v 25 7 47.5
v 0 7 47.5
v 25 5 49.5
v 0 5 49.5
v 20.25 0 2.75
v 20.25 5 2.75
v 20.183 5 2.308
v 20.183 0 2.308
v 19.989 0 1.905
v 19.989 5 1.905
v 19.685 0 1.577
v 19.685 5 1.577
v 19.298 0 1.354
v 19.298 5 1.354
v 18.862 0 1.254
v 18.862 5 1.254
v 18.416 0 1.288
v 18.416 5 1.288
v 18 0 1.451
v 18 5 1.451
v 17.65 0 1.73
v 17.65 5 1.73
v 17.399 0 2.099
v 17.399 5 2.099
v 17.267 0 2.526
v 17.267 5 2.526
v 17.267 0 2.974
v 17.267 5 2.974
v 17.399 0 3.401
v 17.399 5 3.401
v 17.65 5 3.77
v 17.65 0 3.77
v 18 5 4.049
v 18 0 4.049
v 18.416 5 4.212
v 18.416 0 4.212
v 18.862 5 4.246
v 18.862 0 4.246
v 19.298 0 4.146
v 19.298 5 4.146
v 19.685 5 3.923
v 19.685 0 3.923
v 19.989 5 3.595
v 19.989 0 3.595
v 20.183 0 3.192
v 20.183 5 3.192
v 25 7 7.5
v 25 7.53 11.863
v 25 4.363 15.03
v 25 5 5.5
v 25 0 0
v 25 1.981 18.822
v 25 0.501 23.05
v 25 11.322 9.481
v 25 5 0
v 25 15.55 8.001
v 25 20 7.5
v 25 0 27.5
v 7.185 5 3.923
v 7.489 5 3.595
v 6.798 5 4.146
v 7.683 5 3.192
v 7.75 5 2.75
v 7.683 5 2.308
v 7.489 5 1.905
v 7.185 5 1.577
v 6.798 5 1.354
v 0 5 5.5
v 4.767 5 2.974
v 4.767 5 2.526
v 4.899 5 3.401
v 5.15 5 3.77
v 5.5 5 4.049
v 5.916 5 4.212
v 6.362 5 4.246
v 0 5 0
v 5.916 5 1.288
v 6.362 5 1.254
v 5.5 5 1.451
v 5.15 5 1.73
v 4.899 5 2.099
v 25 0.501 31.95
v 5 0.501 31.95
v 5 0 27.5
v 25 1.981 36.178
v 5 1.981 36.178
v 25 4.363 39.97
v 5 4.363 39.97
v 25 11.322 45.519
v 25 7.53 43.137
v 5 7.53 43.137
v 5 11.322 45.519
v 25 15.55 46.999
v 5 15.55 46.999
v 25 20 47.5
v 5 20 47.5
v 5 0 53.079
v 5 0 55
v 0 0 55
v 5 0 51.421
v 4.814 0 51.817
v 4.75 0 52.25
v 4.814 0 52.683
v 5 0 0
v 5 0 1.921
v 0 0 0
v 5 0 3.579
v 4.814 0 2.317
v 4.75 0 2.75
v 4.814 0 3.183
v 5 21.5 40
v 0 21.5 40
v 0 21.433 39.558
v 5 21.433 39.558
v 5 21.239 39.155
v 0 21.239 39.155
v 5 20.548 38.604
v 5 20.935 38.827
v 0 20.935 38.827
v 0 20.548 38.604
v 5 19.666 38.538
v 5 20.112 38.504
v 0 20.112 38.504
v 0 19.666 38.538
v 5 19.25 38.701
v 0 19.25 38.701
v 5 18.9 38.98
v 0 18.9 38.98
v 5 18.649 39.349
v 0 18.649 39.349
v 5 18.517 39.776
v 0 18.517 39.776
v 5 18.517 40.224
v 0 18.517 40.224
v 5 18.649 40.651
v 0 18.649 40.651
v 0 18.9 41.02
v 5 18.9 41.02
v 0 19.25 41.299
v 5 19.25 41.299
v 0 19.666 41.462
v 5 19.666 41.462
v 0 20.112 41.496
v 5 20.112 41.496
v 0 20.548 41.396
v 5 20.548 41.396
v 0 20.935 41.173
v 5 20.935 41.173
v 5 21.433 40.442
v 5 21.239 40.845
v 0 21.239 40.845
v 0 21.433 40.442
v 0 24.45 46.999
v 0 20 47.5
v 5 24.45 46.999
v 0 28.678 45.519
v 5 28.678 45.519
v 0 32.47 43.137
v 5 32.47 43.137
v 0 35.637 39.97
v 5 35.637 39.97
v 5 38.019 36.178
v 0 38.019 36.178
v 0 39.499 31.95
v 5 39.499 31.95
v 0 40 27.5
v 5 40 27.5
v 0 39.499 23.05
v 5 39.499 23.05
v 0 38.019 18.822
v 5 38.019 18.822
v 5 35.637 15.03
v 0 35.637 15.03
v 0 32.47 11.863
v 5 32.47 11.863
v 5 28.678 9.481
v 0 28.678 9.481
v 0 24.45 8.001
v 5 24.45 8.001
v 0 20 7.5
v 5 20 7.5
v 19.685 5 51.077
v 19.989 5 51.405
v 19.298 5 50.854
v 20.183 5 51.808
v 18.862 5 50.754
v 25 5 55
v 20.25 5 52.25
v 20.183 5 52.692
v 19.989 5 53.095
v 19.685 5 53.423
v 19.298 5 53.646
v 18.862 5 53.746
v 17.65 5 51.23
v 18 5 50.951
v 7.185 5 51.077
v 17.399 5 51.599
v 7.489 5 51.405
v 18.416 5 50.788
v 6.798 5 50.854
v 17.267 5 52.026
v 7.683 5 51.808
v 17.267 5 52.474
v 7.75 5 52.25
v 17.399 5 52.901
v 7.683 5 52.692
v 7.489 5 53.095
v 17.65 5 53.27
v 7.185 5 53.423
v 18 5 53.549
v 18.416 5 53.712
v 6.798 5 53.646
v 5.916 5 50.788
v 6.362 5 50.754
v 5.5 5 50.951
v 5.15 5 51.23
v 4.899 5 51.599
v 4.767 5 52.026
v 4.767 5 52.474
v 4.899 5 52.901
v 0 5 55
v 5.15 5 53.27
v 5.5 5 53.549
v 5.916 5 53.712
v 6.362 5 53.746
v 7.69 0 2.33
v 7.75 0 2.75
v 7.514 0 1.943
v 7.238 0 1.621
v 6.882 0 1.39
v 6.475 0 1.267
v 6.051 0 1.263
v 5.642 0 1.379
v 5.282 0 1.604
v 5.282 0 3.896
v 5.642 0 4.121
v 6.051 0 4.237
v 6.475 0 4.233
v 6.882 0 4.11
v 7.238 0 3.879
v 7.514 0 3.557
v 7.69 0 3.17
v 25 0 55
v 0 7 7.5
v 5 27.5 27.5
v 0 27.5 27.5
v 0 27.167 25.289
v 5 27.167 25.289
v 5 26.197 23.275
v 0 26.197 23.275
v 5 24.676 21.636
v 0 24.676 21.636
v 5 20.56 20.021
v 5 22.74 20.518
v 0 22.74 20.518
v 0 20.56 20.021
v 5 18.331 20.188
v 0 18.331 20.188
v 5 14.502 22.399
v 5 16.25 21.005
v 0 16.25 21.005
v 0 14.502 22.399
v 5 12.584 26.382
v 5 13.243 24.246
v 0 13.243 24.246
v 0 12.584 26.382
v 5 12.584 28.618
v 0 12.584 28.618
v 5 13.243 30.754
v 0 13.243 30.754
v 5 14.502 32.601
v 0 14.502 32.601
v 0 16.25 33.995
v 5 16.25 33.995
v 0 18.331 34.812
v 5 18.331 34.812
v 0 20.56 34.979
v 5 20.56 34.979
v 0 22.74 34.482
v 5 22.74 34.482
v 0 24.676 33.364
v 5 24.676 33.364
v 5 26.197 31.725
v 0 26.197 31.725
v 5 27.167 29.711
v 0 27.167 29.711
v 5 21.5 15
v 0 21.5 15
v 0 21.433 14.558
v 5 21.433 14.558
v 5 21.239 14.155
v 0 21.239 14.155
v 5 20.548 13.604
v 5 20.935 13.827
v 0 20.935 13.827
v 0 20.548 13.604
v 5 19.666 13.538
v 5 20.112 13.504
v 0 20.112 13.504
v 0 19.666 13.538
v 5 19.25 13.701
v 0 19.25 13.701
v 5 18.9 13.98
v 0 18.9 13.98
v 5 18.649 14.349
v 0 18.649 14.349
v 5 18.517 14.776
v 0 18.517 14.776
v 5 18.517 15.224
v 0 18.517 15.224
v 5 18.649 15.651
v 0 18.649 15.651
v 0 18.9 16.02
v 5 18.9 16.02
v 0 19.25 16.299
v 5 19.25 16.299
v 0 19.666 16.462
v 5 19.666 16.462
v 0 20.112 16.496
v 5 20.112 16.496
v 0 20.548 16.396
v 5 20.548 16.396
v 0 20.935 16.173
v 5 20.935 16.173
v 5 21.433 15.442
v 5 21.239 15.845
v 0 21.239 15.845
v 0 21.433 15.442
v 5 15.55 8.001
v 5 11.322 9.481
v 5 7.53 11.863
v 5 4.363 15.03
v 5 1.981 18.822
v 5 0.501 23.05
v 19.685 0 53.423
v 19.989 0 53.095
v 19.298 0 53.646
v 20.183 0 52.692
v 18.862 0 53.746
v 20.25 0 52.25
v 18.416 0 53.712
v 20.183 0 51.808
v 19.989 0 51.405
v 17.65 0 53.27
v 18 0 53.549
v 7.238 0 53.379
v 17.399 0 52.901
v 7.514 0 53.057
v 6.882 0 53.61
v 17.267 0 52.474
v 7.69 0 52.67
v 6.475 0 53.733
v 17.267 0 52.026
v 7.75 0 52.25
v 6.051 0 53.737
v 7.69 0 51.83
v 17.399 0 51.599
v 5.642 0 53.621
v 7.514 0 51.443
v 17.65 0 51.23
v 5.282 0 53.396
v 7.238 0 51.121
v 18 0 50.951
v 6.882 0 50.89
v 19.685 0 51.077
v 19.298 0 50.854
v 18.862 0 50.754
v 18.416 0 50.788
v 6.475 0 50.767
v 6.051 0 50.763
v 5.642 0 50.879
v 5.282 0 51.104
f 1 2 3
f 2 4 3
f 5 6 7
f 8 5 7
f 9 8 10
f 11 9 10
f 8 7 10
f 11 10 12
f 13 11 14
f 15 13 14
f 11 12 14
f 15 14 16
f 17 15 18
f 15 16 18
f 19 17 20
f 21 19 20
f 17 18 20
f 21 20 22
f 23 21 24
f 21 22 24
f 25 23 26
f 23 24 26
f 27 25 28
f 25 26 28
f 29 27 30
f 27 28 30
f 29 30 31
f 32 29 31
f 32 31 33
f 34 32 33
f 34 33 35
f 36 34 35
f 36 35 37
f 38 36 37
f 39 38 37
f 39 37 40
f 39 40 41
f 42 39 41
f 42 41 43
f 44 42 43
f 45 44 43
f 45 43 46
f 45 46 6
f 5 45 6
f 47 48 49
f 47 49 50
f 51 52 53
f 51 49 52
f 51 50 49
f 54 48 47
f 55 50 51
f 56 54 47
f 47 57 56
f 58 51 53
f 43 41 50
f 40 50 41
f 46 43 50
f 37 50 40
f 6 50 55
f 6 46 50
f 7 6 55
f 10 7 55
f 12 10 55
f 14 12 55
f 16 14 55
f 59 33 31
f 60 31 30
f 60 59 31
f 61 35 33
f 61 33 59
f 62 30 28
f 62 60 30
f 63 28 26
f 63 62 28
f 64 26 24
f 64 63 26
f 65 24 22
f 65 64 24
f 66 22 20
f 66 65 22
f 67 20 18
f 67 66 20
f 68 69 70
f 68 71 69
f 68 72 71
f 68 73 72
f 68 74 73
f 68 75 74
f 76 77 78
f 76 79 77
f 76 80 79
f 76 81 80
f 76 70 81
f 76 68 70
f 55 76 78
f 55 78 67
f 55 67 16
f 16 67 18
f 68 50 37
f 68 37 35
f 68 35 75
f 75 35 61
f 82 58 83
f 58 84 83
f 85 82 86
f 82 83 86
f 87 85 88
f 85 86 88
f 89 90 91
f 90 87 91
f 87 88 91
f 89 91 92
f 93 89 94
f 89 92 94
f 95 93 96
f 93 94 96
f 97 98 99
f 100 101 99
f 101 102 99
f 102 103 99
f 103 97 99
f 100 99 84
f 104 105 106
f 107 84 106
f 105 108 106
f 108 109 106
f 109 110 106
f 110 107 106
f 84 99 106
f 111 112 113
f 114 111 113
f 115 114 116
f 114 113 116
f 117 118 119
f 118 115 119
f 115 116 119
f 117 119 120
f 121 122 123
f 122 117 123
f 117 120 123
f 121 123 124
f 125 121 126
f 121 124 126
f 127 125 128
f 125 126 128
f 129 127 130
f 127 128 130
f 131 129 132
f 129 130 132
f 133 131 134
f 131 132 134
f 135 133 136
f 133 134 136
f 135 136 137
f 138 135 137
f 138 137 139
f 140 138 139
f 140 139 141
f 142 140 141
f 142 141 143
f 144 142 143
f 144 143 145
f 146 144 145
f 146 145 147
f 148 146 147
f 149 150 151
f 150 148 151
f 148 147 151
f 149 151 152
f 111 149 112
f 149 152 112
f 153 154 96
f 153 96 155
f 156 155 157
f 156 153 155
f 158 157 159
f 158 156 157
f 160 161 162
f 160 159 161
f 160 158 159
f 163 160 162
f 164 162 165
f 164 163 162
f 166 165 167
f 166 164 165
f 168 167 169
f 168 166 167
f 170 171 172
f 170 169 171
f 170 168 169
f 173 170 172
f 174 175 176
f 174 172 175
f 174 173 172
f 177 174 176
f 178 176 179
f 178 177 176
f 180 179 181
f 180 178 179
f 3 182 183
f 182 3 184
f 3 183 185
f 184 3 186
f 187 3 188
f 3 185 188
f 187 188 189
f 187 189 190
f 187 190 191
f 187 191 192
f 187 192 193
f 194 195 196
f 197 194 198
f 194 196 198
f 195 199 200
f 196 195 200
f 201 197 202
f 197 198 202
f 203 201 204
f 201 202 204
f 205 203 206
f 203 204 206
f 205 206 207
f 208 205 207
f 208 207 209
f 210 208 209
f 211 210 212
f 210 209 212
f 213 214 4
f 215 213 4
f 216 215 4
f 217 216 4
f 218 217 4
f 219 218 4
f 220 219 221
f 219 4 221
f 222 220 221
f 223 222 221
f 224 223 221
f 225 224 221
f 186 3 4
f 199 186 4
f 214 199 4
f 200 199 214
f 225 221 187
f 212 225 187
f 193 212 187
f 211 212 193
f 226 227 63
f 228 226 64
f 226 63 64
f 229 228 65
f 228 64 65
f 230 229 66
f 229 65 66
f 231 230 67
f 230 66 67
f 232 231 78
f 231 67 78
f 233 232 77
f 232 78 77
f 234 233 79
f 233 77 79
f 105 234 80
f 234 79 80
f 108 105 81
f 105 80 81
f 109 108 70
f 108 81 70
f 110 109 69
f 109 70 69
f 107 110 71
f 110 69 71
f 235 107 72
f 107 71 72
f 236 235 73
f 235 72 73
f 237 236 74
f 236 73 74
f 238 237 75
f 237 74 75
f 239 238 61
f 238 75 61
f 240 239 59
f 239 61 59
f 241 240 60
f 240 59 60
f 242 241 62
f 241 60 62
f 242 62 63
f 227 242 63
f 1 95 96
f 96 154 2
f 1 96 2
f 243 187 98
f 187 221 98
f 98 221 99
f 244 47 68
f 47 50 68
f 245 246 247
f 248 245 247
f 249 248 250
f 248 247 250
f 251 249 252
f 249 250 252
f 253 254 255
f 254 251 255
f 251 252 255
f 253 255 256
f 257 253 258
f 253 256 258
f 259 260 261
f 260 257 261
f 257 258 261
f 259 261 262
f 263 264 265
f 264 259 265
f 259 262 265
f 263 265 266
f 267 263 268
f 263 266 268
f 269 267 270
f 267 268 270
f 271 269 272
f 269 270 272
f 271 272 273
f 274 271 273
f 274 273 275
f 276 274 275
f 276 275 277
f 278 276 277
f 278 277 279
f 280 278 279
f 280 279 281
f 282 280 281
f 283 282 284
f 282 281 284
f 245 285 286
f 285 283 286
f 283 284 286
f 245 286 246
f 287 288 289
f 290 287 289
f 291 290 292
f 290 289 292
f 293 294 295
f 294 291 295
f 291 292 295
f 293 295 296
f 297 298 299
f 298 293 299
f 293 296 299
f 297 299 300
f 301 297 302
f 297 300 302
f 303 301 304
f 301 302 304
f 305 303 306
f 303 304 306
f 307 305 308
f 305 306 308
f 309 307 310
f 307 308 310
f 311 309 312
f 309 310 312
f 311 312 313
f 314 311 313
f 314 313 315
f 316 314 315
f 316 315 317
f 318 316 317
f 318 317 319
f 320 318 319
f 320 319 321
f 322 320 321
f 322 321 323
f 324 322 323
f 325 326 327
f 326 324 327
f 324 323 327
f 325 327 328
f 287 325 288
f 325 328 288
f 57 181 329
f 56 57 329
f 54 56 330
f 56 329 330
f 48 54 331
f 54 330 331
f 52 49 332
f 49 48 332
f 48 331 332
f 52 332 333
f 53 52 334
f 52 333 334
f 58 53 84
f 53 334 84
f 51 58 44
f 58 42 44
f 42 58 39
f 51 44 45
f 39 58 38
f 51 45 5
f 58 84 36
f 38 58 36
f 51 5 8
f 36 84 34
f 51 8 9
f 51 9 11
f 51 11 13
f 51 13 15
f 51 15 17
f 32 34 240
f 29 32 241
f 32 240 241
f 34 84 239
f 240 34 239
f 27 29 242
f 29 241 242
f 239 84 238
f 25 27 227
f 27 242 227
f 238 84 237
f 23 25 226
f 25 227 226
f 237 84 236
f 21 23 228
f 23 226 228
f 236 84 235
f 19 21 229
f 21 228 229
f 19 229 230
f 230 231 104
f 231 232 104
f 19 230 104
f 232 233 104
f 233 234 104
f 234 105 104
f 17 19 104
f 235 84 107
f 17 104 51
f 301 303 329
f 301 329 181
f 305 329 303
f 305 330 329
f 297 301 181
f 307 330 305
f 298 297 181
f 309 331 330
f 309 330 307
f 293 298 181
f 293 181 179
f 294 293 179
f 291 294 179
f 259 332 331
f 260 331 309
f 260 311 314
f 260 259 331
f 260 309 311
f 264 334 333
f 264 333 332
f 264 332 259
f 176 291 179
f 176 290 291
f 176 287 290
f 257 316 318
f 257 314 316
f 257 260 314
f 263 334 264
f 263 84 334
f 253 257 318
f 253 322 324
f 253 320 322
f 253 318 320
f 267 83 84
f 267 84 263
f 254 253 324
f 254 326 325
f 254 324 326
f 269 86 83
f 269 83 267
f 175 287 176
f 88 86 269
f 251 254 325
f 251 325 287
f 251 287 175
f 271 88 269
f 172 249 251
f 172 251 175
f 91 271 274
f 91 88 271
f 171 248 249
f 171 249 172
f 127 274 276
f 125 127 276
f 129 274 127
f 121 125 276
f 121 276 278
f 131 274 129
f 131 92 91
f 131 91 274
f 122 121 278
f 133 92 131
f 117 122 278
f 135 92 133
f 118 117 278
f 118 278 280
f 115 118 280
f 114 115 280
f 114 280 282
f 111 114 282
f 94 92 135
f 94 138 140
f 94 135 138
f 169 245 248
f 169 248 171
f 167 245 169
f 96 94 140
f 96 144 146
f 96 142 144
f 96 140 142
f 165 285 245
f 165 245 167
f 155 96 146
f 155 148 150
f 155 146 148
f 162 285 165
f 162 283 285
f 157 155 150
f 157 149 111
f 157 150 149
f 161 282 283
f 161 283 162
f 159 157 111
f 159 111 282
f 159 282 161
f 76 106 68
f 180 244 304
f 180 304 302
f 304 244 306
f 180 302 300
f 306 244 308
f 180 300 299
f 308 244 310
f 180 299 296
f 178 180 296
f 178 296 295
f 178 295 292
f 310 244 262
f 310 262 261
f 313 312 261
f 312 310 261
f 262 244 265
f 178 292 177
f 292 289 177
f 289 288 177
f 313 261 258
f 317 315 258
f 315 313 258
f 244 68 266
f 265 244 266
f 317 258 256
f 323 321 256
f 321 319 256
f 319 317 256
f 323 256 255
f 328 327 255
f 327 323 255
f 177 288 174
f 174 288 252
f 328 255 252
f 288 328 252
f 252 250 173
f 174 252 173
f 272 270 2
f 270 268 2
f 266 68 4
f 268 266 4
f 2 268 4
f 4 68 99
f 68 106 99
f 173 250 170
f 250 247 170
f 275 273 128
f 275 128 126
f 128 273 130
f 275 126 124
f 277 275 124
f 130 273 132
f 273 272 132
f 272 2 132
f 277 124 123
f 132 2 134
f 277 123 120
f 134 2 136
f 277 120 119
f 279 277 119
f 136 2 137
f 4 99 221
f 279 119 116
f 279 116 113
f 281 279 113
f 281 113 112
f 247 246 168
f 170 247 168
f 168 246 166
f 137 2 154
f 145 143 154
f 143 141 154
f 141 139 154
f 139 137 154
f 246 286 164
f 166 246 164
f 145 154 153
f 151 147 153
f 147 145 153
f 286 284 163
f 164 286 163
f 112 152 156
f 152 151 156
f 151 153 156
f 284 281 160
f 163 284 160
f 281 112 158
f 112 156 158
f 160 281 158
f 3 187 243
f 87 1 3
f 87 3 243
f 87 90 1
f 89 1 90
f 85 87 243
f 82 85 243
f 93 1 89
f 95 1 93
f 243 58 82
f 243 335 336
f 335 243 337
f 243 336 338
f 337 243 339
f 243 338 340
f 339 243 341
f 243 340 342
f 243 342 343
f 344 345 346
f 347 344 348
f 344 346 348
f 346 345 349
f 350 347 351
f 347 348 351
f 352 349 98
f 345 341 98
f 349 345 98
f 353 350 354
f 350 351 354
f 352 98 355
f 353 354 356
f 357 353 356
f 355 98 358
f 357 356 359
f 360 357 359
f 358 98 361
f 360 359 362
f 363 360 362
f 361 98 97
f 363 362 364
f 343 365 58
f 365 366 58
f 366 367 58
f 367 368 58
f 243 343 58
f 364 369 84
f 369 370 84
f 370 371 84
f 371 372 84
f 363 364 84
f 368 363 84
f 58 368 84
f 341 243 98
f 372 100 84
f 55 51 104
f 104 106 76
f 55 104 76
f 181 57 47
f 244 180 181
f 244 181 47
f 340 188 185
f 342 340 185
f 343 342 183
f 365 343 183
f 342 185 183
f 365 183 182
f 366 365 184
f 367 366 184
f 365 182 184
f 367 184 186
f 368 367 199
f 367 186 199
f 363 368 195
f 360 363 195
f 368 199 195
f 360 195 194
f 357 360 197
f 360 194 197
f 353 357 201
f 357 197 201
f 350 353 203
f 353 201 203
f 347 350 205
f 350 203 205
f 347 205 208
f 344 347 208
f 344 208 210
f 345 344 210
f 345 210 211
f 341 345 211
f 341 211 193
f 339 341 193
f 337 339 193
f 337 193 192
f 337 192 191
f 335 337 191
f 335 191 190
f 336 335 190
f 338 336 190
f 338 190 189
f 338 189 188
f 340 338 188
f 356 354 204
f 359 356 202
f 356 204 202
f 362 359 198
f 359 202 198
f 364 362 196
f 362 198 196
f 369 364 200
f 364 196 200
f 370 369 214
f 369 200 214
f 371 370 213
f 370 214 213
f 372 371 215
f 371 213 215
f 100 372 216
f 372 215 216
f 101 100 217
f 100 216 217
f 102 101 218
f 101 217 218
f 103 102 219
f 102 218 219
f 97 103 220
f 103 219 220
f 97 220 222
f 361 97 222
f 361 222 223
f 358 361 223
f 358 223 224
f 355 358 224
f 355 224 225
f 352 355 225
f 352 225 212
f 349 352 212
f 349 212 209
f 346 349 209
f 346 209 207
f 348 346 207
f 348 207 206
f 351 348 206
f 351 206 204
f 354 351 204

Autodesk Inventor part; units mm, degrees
ref_plane "YZ Plane" through (0, 0, 0) normal (1, 0, 0) x (0, 1, 0)
ref_plane "XZ Plane" through (0, 0, 0) normal (0, 1, 0) x (-1, 0, 0)
ref_plane "XY Plane" through (0, 0, 0) normal (0, 0, 1) x (1, 0, 0)
sketch "Sketch1" plane through (0, 0, 0) normal (1, 0, 0) x (0, 1, 0)
  arc A0 (20, 7.5) -> (20, 47.5) centre (20, 27.5) ccw
  line L0 (5, 55) -> (0, 55)
  line L1 (0, 55) -> (0, 0)
  line L2 (0, 0) -> (5, 0)
  circle A1 centre (20, 27.5) radius 20 construction
  circle A2 centre (20, 15) radius 1.5
  circle A3 centre (20, 40) radius 1.5
  circle A4 centre (20, 27.5) radius 7.5
  line L3 (20, 47.5) -> (5, 47.5)
  line L4 (5, 47.5) -> (5, 55)
  line L5 (20, 7.5) -> (5, 7.5)
  line L6 (5, 7.5) -> (5, 0)
  dimension "d0" = 20
  dimension "d3" = 5
  dimension "d5" = 3
  dimension "d6" = 3
  dimension "d7" = 25
  dimension "d8" = 12.5
  dimension "d9" = 15
  dimension "d30" = 55
extrude "Extrusion1" add sketch "Sketch1" along normal blind 5
sketch "Sketch2" plane through (5, 0, 0) normal (1, 0, 0) x (0, 0, -1)
  line L0 (-55, 5) -> (-55, 0) projected
  line L1 (-47.5, 20) -> (-47.5, 5) projected
  line L2 (-55, 5) -> (-47.5, 5)
  line L3 (-47.5, 5) -> (-47.5, 20)
  line L4 (-55, 0) -> (0, 0) projected
  line L5 (-55, 0) -> (0, 0)
  line L6 (-55, 0) -> (-55, 5)
  circle A0 centre (-27.5, 20) radius 20
  arc A1 (-7.5, 20) -> (-47.5, 20) centre (-27.5, 20) ccw projected
  line L7 (0, 0) -> (0, 5) projected
  line L8 (0, 0) -> (0, 5)
  line L9 (0, 5) -> (-7.5, 5)
  line L10 (-7.5, 5) -> (-7.5, 20) projected
  line L11 (-7.5, 5) -> (-7.5, 20)
  point P0 (-7.5, 20)
  point P1 (-27.5, 0)
extrude "Extrusion2" add sketch "Sketch2" along normal blind 20 contours L2 L1 A0 L4 L0 | A0 L10 L9 L7 L4
chamfer "Chamfer1" distance 2 angle 45 2 edges at (12.5, 5, 7.5) (12.5, 5, 47.5)
sketch "Sketch3" plane through (0, 5, 0) normal (0, 1, 0) x (1, 0, 0)
  circle A0 centre (6.25, -2.75) radius 1.5
  circle A1 centre (18.75, -2.75) radius 1.5
  circle A2 centre (6.25, -52.25) radius 1.5
  circle A3 centre (18.75, -52.25) radius 1.5
  line L0 (0, -55) -> (25, -55) projected
  line L1 (0, -49.5) -> (25, -49.5) projected
  line L2 (0, 0) -> (25, 0) projected
  line L3 (25, -5.5) -> (0, -5.5) projected
  line L4 (0, -49.5) -> (0, -55) projected
  line L5 (25, -49.5) -> (25, -55) projected
  dimension "d20" = 3
  dimension "d21" = 2.75
  dimension "d22" = 2.75
  dimension "d23" = 2.75
  dimension "d24" = 2.75
  dimension "d25" = 6.25
  dimension "d26" = 6.25
  dimension "d27" = 12.5
extrude "Extrusion3" cut sketch "Sketch3" against normal through all contours A0 | A1 | A2 | A3
equation "\"d8\" = 0.5 * d7"
equation "\"d21\" = d22"
equation "\"d23\" = d24"
equation "\"d25\" = 0.5 * d27"
equation "\"d26\" = d25"
properties part number "motor mount"
